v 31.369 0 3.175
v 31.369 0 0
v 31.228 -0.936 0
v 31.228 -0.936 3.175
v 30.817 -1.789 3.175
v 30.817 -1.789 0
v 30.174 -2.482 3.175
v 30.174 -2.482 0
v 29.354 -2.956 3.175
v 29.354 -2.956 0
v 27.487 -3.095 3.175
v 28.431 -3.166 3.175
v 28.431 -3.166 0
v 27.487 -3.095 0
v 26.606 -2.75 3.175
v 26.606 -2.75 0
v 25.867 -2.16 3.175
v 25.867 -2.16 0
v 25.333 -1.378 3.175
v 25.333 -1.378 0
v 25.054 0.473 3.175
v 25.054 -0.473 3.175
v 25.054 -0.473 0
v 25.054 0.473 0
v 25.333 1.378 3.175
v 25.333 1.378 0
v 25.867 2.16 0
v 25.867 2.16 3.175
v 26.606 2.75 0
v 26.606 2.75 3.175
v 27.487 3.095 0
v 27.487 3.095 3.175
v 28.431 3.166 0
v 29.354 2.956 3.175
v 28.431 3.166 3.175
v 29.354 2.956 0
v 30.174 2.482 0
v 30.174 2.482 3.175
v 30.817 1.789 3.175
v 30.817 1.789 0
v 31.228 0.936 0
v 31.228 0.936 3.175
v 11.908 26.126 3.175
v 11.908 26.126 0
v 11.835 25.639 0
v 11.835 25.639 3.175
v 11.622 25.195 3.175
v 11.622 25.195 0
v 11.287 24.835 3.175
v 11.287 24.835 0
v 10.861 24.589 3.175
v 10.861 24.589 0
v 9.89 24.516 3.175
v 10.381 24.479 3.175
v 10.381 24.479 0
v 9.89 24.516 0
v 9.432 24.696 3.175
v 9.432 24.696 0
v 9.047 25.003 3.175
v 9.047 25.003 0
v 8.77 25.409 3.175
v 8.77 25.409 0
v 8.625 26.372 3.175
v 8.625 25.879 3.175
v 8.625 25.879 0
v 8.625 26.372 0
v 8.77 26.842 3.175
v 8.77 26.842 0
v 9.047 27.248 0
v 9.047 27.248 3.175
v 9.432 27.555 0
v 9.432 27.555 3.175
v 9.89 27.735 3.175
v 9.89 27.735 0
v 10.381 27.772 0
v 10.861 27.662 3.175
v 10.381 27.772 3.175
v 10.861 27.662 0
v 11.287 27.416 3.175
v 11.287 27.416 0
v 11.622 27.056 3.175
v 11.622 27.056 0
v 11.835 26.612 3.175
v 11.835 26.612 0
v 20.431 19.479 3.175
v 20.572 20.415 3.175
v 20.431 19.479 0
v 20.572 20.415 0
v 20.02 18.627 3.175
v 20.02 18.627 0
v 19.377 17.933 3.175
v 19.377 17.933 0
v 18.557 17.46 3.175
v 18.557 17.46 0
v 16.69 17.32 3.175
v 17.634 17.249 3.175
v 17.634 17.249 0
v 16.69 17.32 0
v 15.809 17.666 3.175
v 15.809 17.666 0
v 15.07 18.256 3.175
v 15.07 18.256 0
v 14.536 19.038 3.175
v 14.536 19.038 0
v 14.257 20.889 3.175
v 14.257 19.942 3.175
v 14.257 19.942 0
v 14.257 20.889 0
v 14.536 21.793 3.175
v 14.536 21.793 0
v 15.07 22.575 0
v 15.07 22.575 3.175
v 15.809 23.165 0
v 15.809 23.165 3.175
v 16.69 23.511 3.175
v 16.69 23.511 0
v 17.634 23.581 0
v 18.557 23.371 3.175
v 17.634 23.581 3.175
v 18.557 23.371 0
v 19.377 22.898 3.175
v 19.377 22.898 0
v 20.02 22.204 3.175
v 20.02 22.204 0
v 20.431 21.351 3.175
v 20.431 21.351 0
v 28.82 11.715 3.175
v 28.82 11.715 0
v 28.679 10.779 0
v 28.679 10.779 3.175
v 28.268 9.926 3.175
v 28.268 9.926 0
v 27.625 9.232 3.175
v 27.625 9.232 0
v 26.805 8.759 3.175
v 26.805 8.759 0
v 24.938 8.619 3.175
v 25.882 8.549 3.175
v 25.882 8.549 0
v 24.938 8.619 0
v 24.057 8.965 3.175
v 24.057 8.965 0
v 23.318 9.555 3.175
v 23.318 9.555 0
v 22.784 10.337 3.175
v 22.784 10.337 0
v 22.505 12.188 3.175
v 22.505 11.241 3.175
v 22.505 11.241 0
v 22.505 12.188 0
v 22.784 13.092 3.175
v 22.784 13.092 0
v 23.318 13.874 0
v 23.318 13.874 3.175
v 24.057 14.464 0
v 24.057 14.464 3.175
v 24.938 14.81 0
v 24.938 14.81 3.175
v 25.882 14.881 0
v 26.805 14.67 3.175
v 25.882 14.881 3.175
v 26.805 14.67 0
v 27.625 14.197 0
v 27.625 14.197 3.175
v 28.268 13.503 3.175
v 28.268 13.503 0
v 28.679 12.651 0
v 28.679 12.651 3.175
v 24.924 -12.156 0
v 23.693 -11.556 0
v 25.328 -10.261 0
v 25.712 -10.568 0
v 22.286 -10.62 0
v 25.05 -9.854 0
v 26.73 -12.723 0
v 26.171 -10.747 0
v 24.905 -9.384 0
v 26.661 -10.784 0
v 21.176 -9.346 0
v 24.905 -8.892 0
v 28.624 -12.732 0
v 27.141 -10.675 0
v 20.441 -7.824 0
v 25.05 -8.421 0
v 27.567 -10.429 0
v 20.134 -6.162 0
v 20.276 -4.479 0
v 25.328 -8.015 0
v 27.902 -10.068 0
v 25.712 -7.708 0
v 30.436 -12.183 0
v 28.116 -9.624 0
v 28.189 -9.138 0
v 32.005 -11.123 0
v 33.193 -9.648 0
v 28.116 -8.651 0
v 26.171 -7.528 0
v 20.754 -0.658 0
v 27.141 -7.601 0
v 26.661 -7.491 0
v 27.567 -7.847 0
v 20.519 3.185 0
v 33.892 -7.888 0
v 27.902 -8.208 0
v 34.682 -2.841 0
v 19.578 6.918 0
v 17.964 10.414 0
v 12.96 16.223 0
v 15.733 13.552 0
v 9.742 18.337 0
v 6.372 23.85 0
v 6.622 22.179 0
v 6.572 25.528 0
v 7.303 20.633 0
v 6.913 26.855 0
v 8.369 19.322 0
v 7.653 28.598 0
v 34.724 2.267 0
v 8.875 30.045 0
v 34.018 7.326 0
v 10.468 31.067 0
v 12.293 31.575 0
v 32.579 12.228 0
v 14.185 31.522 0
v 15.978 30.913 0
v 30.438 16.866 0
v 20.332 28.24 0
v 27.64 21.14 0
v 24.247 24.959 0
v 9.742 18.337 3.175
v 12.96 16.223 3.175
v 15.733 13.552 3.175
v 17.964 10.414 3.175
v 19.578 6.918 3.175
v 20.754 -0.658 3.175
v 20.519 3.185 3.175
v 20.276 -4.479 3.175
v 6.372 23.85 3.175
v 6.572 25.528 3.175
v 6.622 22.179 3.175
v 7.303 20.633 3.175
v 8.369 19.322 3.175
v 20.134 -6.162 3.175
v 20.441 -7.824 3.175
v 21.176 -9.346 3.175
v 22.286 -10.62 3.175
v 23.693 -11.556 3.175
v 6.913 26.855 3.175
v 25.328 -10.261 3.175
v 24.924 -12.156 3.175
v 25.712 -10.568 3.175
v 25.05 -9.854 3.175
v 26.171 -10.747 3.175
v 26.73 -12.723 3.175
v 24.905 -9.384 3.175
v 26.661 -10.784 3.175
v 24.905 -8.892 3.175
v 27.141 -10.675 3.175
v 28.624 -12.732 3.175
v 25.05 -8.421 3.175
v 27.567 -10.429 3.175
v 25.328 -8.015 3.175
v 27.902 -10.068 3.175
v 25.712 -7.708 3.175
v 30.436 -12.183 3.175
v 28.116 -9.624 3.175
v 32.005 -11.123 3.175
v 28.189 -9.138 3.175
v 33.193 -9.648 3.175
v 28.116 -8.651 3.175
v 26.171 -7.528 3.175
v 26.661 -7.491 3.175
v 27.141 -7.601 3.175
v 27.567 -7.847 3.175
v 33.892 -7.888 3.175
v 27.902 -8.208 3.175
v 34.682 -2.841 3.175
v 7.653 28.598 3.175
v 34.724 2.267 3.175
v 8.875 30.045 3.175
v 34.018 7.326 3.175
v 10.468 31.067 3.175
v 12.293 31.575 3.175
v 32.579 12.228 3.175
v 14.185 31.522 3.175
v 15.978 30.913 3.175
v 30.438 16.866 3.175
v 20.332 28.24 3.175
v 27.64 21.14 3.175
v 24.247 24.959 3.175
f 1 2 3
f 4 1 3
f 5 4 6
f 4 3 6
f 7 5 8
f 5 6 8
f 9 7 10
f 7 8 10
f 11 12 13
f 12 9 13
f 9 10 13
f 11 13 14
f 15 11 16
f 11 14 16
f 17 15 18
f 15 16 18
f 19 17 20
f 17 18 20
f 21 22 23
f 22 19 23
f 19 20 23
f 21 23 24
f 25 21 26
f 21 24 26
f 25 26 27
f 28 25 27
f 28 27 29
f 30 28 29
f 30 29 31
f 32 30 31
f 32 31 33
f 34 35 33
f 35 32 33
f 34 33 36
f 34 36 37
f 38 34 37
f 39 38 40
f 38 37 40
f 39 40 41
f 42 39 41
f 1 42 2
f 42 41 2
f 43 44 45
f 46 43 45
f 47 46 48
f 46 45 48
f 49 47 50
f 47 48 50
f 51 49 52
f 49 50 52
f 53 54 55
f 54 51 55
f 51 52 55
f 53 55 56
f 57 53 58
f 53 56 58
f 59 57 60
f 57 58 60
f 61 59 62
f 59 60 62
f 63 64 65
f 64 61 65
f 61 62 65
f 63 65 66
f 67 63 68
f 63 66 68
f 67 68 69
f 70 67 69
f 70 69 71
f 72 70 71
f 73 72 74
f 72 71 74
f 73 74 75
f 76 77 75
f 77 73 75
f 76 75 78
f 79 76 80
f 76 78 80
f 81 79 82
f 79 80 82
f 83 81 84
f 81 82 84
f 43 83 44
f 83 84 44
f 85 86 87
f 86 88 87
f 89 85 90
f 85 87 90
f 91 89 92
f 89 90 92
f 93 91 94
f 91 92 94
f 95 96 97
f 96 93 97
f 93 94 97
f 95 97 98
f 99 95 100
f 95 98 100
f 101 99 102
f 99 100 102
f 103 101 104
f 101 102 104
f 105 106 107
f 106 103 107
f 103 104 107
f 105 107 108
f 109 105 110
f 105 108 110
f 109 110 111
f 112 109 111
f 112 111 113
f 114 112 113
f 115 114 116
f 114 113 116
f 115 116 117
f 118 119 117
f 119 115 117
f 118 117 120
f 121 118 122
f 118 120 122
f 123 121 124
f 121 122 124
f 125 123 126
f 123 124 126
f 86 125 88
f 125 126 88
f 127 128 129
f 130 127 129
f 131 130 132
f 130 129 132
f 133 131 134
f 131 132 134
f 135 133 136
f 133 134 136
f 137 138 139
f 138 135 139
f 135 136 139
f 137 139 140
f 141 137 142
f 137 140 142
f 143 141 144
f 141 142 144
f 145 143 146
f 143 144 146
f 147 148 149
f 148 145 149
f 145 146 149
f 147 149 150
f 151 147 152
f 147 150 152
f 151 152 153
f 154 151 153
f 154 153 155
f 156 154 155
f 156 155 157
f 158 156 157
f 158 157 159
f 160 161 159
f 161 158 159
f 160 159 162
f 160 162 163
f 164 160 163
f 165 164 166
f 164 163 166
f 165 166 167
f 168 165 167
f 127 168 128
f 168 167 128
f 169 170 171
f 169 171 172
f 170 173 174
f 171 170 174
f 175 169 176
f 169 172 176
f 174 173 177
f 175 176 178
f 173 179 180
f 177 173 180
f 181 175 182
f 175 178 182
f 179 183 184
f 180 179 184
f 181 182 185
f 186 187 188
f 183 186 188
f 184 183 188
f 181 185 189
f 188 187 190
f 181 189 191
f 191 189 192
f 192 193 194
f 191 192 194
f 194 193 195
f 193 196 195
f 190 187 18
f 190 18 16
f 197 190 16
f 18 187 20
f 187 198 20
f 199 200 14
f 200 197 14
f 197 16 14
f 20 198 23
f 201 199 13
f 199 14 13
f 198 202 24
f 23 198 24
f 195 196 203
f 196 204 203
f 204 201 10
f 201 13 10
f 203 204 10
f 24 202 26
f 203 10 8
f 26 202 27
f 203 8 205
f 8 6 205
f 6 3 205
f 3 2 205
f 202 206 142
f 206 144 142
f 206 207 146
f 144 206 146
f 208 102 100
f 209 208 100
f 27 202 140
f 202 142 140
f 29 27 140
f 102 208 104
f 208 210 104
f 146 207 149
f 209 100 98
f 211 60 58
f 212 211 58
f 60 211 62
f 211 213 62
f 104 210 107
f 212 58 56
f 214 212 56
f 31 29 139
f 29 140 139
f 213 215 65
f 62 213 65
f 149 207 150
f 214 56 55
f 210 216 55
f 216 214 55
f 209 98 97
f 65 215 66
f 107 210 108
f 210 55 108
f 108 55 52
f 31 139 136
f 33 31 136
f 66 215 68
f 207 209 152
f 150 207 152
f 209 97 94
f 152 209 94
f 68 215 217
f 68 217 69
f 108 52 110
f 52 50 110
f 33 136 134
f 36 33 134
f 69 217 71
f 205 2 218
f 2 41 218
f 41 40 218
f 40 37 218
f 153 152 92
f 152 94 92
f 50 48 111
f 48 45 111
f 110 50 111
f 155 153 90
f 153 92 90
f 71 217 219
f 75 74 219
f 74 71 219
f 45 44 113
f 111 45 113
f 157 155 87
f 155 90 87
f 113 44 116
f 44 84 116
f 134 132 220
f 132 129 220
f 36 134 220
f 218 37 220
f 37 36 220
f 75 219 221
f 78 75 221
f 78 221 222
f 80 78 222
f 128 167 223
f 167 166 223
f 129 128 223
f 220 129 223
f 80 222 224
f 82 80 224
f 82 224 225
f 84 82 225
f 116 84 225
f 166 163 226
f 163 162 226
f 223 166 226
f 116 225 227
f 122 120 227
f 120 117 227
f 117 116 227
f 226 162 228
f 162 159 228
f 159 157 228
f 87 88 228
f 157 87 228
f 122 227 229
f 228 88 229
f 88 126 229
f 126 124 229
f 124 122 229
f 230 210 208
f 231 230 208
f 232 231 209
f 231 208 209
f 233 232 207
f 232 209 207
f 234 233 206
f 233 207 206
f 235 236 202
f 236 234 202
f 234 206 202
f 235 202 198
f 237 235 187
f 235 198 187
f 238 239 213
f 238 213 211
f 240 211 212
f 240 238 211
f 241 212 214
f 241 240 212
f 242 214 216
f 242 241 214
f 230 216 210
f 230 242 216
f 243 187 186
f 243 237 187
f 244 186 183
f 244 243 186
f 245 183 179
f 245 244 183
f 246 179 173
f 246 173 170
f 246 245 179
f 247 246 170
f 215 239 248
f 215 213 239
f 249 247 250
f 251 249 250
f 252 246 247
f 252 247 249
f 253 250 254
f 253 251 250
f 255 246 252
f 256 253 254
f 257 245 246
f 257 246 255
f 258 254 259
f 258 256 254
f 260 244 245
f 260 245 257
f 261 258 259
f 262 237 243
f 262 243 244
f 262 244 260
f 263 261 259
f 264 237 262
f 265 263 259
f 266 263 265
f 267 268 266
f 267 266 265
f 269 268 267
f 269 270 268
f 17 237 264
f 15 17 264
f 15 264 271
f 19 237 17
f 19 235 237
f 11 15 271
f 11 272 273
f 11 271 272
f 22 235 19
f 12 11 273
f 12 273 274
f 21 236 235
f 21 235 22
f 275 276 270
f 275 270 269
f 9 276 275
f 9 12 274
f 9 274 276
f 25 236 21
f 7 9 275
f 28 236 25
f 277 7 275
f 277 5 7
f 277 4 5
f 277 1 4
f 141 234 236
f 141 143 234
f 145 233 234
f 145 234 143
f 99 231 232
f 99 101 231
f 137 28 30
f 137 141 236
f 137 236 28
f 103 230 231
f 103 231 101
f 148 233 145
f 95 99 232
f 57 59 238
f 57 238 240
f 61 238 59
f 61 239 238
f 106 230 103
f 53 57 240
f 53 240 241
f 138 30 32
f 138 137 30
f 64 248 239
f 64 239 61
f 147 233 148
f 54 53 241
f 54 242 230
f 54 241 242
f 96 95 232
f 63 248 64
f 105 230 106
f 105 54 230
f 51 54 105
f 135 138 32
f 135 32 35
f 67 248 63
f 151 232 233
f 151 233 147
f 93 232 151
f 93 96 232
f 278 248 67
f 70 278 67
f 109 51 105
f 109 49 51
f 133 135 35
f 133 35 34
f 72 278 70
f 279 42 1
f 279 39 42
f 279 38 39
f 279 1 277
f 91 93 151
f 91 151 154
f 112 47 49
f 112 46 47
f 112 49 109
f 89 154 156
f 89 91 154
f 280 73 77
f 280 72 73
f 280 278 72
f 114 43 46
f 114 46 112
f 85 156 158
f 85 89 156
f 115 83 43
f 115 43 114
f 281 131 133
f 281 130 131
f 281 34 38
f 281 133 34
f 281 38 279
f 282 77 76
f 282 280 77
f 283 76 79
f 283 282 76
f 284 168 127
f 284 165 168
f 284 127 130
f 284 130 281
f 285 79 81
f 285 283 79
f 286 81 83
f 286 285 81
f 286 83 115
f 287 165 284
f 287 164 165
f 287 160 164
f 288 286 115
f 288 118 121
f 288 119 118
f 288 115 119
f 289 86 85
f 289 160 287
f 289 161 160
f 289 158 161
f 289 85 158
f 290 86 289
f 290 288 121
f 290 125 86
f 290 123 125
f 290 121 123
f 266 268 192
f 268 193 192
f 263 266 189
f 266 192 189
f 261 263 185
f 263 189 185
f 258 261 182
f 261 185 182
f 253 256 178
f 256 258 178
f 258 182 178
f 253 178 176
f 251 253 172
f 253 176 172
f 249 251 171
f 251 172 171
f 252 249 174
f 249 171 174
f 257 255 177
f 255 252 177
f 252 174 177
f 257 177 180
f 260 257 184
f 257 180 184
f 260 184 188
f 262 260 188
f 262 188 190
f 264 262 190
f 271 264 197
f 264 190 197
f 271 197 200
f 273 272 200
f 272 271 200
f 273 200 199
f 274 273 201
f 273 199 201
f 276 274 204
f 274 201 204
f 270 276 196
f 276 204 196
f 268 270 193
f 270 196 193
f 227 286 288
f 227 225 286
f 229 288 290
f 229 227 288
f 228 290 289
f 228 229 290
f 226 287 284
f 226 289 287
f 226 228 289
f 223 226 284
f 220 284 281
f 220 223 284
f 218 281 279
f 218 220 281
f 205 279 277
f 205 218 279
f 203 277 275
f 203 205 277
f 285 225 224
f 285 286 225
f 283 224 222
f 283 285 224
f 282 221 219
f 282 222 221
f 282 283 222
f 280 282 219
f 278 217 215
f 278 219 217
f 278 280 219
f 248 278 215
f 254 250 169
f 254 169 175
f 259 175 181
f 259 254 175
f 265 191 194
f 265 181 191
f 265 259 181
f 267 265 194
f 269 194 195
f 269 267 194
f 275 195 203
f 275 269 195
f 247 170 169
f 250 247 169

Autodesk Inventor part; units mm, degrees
ref_plane "YZ Plane" through (0, 0, 0) normal (1, 0, 0) x (0, 1, 0)
ref_plane "XZ Plane" through (0, 0, 0) normal (0, 1, 0) x (-1, 0, 0)
ref_plane "XY Plane" through (0, 0, 0) normal (0, 0, 1) x (1, 0, 0)
sketch "Sketch2" plane through (0, 0, 0) normal (0, 0, 1) x (1, 0, 0)
  circle A0 centre (28.194, 0) radius 3.175
  circle A1 centre (25.645, 11.7147) radius 3.175
  circle A2 centre (17.397, 20.4153) radius 3.175
  line L0 (0, 0) -> (28.194, 0) construction
  line L1 (25.645, 11.7147) -> (0, 0) construction
  line L2 (17.397, 20.4153) -> (0, 0) construction
  line L3 (18.663, -9.1026) -> (31.2762, -15.2544)
  line L4 (5.1766, 20.1089) -> (8.6751, 33.6993)
  arc A3 (18.663, -9.1026) -> (5.1766, 20.1089) centre (0, 0) ccw
  arc A4 (31.2762, -15.2544) -> (8.6751, 33.6993) centre (0, 0) ccw
  circle A5 centre (10.2574, 26.1255) radius 1.651
  circle A6 centre (26.5379, -9.1377) radius 1.651
  line L5 (10.2574, 26.1255) -> (0, 0) construction
  line L6 (0, 0) -> (26.5379, -9.1377) construction
  dimension "d2" = 6.35
  dimension "d4" = 28.194
  dimension "d5" = 26.8224
  dimension "d6" = 11.9888
  dimension "d7" = 11.9888
  dimension "d9" = 41.529
  dimension "d11" = 69.596
  dimension "d14" = 28.067
  dimension "d15" = 19
  dimension "d16" = 19
  dimension "d17" = 7
  dimension "d18" = 7
  dimension "d19" = 3.302
extrude "Extrusion1" add sketch "Sketch2" along normal blind 3.175
fillet "Fillet1" radius 6.35 4 edges at (8.6751, 33.6993, 1.5875) (5.1766, 20.1089, 1.5875) (18.663, -9.1026, 1.5875) (31.2762, -15.2544, 1.5875)
properties part number "gearboxBearingHolderForward" material "Aluminum 6061"
